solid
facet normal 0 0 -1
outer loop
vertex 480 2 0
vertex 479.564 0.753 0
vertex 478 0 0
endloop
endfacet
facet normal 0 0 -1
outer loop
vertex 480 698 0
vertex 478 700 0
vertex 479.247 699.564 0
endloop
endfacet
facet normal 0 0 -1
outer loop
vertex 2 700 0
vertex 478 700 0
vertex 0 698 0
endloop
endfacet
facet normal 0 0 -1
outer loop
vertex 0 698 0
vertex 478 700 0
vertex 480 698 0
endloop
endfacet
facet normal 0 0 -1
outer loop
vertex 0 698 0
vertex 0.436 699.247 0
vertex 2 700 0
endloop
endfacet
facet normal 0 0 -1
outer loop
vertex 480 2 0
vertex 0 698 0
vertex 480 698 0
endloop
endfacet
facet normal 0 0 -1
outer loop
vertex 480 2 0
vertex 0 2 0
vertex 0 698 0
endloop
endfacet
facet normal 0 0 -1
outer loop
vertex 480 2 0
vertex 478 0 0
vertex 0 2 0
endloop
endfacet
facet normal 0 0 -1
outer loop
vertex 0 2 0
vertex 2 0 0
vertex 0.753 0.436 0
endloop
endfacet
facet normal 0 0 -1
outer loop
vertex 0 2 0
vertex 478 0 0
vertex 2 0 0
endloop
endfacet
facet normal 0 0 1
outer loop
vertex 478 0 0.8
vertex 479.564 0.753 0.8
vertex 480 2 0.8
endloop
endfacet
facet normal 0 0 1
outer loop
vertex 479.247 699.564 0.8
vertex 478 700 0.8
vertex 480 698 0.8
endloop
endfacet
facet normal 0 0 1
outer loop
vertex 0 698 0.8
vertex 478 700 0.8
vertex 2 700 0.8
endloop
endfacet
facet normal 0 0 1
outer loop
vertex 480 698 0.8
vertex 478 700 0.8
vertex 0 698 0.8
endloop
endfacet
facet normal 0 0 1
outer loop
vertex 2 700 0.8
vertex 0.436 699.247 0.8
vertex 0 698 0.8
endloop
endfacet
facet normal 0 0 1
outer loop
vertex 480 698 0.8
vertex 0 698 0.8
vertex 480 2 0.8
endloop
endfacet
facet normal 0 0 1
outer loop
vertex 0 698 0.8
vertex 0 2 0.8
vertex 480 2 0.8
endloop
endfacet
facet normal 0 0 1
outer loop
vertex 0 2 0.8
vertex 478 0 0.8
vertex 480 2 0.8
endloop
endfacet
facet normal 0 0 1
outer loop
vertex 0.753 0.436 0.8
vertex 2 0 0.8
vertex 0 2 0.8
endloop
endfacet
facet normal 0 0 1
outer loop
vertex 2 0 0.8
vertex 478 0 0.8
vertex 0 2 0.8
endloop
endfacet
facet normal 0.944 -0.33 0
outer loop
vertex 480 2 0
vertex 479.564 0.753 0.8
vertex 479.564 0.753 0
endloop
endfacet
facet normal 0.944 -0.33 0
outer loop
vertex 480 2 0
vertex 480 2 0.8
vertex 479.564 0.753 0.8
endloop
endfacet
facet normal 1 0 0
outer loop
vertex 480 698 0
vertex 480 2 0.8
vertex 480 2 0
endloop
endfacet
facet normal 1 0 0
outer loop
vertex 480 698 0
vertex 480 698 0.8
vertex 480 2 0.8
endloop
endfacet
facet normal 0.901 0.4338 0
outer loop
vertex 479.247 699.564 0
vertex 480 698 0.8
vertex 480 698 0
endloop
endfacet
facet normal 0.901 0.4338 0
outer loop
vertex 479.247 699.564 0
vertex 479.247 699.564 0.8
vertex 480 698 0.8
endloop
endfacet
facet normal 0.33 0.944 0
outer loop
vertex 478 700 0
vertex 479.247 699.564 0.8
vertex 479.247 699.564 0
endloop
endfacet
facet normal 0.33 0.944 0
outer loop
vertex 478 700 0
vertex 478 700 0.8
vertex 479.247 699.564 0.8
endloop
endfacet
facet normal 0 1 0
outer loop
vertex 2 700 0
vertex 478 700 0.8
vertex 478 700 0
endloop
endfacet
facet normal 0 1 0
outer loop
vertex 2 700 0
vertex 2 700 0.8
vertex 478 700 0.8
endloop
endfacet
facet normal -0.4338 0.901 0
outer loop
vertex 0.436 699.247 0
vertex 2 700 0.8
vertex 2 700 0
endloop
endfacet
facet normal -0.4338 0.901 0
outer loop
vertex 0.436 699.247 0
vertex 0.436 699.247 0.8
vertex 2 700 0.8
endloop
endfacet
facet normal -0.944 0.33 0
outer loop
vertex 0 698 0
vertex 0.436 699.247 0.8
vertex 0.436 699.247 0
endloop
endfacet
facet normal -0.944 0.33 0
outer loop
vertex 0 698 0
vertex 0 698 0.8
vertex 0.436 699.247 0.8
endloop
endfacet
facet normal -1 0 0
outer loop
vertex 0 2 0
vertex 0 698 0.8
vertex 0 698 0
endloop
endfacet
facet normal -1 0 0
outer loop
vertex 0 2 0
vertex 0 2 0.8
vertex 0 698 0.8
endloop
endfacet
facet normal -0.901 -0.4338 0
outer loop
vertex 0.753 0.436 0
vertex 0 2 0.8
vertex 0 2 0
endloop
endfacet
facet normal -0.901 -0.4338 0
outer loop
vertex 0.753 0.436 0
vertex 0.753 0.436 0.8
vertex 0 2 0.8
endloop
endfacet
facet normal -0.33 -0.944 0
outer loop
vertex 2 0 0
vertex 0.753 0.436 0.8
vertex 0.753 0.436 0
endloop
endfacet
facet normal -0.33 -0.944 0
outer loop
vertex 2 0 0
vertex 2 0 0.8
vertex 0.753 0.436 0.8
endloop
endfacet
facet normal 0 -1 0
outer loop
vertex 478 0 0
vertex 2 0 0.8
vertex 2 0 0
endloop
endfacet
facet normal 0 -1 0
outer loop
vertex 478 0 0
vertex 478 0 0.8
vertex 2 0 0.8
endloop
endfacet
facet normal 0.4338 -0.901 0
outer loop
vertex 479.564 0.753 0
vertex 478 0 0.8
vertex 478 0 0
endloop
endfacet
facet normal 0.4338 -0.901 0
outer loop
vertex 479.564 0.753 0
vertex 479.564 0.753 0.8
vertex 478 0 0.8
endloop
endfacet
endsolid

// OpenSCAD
// file: ../libs/utils.scad
// SketchCaddy - 通用工具函数库

use <global_params.scad>

// ============================================
// 1010铝型材截面模块
// ============================================
module extrusion_profile_1010(size = 10) {
    wall = 1.2;
    slot_width = 4;
    slot_depth = 2.5;
    
    difference() {
        // 外轮廓
        square(size, center = true);
        
        // 中心孔
        circle(d = size - 2 * wall);
        
        // 四个T槽
        for (angle = [0, 90, 180, 270]) {
            rotate([0, 0, angle])
            translate([0, size/2 - slot_depth/2])
            square([slot_width, slot_depth + 0.1], center = true);
        }
    }
}

// ============================================
// 铝型材拉伸模块
// ============================================
module extrusion_1010(length, size = 10) {
    color(color_frame)
    rotate([90, 0, 0])
    linear_extrude(height = length, center = false)
    extrusion_profile_1010(size);
}

// 沿X轴的型材
module extrusion_x(length, size = 10) {
    rotate([0, 90, 0])
    rotate([0, 0, 90])
    extrusion_1010(length, size);
}

// 沿Y轴的型材
module extrusion_y(length, size = 10) {
    rotate([0, 0, 0])
    extrusion_1010(length, size);
}

// 沿Z轴的型材
module extrusion_z(length, size = 10) {
    rotate([-90, 0, 0])
    extrusion_1010(length, size);
}

// ============================================
// 圆角矩形
// ============================================
module rounded_rect(size, radius, height) {
    linear_extrude(height = height)
    offset(r = radius)
    offset(r = -radius)
    square([size.x, size.y], center = true);
}

// ============================================
// 带圆角的面板
// ============================================
module panel(width, height, thickness, corner_radius = 3) {
    color(color_panel)
    translate([0, 0, thickness/2])
    rounded_rect([width, height], corner_radius, thickness);
}

// ============================================
// 螺丝孔
// ============================================
module screw_hole(diameter, depth, countersink = false) {
    union() {
        cylinder(d = diameter, h = depth + 0.1);
        if (countersink) {
            translate([0, 0, depth - diameter/2])
            cylinder(d1 = diameter, d2 = diameter * 2, h = diameter/2);
        }
    }
}

// ============================================
// 爆炸视图辅助
// ============================================
module explode(direction, distance, explode_factor = 0) {
    translate(direction * distance * explode_factor)
    children();
}
// file: ../libs/global_params.scad
// SketchCaddy - 全局参数定义
// 所有单位：毫米 (mm)

// ============================================
// 核心箱体尺寸
// ============================================
global_box_length = 520;   // 长 (X轴)
global_box_width = 520;    // 宽 (Y轴)
global_box_height = 750;   // 高 (Z轴)

// ============================================
// 面板厚度
// ============================================
panel_thickness = 5; // PP蜂窝板或航空板厚度

// ============================================
// 铝型材规格 (1010系列)
// ============================================
extrusion_size = 10;           // 10mm x 10mm 轻型铝型材
extrusion_slot_width = 8;      // 型材T型槽宽度
extrusion_wall_thickness = 1.2; // 型材壁厚
extrusion_inner_size = extrusion_size - 2 * extrusion_wall_thickness;

// ============================================
// 画架参数
// ============================================
easel_bag_length = 750;        // 画架袋长度
easel_bag_diameter = 100;      // 画架袋直径
easel_height_max = 1500;       // 画架最大展开高度

// ============================================
// 轮子参数
// ============================================
wheel_diameter = 203.2;        // 8英寸 = 203.2mm
wheel_width = 50;              // 轮宽

// ============================================
// 公差与配合
// ============================================
tolerance = 1;                 // 面板与框架配合间隙
$fn = 32;                      // 圆形分辨率

// ============================================
// 颜色定义
// ============================================
color_frame = [0.7, 0.7, 0.7];      // 铝型材银灰色
color_panel = [0.2, 0.2, 0.2];      // 面板深灰色
color_accent = [0.9, 0.5, 0.1];     // 强调色橙色
color_wheel = [0.1, 0.1, 0.1];      // 轮子黑色
color_handle = [0.3, 0.3, 0.35];    // 拉杆深灰

// ============================================
// 辅助函数
// ============================================

// 计算框架内部可用空间
function inner_length() = global_box_length - 2 * extrusion_size - 2 * panel_thickness;
function inner_width() = global_box_width - 2 * extrusion_size - 2 * panel_thickness;
function inner_height() = global_box_height - 2 * extrusion_size - 2 * panel_thickness;
// main file
// ============================================
// B10_Magnetic_Surface.scad
// 磁性工作表面 - 柔性磁白板，带背胶
// ============================================

use <../libs/global_params.scad>
use <../libs/utils.scad>

// 磁性表面尺寸
surface_width = 480;         // 略小于面板宽度
surface_height = 700;        // 略小于面板高度
surface_thickness = 0.8;     // 柔性磁白板厚度

// ============================================
// 磁性表面模块
// ============================================
module B10_Magnetic_Surface() {
    color([0.95, 0.95, 0.95])  // 白色
    translate([surface_width/2, surface_height/2, 0])
    rounded_rect([surface_width, surface_height], 2, surface_thickness);
}

// 带边框的磁性表面（可选装饰边框）
module B10_Magnetic_Surface_Framed() {
    frame_width = 5;
    
    difference() {
        // 边框
        color([0.3, 0.3, 0.3])
        translate([surface_width/2, surface_height/2, 0])
        rounded_rect([surface_width + 2*frame_width, surface_height + 2*frame_width], 
                     3, surface_thickness + 0.5);
        
        // 中间镂空
        translate([frame_width, frame_width, -0.1])
        cube([surface_width, surface_height, surface_thickness + 0.7]);
    }
    
    // 白板表面
    translate([frame_width, frame_width, 0])
    B10_Magnetic_Surface();
}

// 预览
B10_Magnetic_Surface();
